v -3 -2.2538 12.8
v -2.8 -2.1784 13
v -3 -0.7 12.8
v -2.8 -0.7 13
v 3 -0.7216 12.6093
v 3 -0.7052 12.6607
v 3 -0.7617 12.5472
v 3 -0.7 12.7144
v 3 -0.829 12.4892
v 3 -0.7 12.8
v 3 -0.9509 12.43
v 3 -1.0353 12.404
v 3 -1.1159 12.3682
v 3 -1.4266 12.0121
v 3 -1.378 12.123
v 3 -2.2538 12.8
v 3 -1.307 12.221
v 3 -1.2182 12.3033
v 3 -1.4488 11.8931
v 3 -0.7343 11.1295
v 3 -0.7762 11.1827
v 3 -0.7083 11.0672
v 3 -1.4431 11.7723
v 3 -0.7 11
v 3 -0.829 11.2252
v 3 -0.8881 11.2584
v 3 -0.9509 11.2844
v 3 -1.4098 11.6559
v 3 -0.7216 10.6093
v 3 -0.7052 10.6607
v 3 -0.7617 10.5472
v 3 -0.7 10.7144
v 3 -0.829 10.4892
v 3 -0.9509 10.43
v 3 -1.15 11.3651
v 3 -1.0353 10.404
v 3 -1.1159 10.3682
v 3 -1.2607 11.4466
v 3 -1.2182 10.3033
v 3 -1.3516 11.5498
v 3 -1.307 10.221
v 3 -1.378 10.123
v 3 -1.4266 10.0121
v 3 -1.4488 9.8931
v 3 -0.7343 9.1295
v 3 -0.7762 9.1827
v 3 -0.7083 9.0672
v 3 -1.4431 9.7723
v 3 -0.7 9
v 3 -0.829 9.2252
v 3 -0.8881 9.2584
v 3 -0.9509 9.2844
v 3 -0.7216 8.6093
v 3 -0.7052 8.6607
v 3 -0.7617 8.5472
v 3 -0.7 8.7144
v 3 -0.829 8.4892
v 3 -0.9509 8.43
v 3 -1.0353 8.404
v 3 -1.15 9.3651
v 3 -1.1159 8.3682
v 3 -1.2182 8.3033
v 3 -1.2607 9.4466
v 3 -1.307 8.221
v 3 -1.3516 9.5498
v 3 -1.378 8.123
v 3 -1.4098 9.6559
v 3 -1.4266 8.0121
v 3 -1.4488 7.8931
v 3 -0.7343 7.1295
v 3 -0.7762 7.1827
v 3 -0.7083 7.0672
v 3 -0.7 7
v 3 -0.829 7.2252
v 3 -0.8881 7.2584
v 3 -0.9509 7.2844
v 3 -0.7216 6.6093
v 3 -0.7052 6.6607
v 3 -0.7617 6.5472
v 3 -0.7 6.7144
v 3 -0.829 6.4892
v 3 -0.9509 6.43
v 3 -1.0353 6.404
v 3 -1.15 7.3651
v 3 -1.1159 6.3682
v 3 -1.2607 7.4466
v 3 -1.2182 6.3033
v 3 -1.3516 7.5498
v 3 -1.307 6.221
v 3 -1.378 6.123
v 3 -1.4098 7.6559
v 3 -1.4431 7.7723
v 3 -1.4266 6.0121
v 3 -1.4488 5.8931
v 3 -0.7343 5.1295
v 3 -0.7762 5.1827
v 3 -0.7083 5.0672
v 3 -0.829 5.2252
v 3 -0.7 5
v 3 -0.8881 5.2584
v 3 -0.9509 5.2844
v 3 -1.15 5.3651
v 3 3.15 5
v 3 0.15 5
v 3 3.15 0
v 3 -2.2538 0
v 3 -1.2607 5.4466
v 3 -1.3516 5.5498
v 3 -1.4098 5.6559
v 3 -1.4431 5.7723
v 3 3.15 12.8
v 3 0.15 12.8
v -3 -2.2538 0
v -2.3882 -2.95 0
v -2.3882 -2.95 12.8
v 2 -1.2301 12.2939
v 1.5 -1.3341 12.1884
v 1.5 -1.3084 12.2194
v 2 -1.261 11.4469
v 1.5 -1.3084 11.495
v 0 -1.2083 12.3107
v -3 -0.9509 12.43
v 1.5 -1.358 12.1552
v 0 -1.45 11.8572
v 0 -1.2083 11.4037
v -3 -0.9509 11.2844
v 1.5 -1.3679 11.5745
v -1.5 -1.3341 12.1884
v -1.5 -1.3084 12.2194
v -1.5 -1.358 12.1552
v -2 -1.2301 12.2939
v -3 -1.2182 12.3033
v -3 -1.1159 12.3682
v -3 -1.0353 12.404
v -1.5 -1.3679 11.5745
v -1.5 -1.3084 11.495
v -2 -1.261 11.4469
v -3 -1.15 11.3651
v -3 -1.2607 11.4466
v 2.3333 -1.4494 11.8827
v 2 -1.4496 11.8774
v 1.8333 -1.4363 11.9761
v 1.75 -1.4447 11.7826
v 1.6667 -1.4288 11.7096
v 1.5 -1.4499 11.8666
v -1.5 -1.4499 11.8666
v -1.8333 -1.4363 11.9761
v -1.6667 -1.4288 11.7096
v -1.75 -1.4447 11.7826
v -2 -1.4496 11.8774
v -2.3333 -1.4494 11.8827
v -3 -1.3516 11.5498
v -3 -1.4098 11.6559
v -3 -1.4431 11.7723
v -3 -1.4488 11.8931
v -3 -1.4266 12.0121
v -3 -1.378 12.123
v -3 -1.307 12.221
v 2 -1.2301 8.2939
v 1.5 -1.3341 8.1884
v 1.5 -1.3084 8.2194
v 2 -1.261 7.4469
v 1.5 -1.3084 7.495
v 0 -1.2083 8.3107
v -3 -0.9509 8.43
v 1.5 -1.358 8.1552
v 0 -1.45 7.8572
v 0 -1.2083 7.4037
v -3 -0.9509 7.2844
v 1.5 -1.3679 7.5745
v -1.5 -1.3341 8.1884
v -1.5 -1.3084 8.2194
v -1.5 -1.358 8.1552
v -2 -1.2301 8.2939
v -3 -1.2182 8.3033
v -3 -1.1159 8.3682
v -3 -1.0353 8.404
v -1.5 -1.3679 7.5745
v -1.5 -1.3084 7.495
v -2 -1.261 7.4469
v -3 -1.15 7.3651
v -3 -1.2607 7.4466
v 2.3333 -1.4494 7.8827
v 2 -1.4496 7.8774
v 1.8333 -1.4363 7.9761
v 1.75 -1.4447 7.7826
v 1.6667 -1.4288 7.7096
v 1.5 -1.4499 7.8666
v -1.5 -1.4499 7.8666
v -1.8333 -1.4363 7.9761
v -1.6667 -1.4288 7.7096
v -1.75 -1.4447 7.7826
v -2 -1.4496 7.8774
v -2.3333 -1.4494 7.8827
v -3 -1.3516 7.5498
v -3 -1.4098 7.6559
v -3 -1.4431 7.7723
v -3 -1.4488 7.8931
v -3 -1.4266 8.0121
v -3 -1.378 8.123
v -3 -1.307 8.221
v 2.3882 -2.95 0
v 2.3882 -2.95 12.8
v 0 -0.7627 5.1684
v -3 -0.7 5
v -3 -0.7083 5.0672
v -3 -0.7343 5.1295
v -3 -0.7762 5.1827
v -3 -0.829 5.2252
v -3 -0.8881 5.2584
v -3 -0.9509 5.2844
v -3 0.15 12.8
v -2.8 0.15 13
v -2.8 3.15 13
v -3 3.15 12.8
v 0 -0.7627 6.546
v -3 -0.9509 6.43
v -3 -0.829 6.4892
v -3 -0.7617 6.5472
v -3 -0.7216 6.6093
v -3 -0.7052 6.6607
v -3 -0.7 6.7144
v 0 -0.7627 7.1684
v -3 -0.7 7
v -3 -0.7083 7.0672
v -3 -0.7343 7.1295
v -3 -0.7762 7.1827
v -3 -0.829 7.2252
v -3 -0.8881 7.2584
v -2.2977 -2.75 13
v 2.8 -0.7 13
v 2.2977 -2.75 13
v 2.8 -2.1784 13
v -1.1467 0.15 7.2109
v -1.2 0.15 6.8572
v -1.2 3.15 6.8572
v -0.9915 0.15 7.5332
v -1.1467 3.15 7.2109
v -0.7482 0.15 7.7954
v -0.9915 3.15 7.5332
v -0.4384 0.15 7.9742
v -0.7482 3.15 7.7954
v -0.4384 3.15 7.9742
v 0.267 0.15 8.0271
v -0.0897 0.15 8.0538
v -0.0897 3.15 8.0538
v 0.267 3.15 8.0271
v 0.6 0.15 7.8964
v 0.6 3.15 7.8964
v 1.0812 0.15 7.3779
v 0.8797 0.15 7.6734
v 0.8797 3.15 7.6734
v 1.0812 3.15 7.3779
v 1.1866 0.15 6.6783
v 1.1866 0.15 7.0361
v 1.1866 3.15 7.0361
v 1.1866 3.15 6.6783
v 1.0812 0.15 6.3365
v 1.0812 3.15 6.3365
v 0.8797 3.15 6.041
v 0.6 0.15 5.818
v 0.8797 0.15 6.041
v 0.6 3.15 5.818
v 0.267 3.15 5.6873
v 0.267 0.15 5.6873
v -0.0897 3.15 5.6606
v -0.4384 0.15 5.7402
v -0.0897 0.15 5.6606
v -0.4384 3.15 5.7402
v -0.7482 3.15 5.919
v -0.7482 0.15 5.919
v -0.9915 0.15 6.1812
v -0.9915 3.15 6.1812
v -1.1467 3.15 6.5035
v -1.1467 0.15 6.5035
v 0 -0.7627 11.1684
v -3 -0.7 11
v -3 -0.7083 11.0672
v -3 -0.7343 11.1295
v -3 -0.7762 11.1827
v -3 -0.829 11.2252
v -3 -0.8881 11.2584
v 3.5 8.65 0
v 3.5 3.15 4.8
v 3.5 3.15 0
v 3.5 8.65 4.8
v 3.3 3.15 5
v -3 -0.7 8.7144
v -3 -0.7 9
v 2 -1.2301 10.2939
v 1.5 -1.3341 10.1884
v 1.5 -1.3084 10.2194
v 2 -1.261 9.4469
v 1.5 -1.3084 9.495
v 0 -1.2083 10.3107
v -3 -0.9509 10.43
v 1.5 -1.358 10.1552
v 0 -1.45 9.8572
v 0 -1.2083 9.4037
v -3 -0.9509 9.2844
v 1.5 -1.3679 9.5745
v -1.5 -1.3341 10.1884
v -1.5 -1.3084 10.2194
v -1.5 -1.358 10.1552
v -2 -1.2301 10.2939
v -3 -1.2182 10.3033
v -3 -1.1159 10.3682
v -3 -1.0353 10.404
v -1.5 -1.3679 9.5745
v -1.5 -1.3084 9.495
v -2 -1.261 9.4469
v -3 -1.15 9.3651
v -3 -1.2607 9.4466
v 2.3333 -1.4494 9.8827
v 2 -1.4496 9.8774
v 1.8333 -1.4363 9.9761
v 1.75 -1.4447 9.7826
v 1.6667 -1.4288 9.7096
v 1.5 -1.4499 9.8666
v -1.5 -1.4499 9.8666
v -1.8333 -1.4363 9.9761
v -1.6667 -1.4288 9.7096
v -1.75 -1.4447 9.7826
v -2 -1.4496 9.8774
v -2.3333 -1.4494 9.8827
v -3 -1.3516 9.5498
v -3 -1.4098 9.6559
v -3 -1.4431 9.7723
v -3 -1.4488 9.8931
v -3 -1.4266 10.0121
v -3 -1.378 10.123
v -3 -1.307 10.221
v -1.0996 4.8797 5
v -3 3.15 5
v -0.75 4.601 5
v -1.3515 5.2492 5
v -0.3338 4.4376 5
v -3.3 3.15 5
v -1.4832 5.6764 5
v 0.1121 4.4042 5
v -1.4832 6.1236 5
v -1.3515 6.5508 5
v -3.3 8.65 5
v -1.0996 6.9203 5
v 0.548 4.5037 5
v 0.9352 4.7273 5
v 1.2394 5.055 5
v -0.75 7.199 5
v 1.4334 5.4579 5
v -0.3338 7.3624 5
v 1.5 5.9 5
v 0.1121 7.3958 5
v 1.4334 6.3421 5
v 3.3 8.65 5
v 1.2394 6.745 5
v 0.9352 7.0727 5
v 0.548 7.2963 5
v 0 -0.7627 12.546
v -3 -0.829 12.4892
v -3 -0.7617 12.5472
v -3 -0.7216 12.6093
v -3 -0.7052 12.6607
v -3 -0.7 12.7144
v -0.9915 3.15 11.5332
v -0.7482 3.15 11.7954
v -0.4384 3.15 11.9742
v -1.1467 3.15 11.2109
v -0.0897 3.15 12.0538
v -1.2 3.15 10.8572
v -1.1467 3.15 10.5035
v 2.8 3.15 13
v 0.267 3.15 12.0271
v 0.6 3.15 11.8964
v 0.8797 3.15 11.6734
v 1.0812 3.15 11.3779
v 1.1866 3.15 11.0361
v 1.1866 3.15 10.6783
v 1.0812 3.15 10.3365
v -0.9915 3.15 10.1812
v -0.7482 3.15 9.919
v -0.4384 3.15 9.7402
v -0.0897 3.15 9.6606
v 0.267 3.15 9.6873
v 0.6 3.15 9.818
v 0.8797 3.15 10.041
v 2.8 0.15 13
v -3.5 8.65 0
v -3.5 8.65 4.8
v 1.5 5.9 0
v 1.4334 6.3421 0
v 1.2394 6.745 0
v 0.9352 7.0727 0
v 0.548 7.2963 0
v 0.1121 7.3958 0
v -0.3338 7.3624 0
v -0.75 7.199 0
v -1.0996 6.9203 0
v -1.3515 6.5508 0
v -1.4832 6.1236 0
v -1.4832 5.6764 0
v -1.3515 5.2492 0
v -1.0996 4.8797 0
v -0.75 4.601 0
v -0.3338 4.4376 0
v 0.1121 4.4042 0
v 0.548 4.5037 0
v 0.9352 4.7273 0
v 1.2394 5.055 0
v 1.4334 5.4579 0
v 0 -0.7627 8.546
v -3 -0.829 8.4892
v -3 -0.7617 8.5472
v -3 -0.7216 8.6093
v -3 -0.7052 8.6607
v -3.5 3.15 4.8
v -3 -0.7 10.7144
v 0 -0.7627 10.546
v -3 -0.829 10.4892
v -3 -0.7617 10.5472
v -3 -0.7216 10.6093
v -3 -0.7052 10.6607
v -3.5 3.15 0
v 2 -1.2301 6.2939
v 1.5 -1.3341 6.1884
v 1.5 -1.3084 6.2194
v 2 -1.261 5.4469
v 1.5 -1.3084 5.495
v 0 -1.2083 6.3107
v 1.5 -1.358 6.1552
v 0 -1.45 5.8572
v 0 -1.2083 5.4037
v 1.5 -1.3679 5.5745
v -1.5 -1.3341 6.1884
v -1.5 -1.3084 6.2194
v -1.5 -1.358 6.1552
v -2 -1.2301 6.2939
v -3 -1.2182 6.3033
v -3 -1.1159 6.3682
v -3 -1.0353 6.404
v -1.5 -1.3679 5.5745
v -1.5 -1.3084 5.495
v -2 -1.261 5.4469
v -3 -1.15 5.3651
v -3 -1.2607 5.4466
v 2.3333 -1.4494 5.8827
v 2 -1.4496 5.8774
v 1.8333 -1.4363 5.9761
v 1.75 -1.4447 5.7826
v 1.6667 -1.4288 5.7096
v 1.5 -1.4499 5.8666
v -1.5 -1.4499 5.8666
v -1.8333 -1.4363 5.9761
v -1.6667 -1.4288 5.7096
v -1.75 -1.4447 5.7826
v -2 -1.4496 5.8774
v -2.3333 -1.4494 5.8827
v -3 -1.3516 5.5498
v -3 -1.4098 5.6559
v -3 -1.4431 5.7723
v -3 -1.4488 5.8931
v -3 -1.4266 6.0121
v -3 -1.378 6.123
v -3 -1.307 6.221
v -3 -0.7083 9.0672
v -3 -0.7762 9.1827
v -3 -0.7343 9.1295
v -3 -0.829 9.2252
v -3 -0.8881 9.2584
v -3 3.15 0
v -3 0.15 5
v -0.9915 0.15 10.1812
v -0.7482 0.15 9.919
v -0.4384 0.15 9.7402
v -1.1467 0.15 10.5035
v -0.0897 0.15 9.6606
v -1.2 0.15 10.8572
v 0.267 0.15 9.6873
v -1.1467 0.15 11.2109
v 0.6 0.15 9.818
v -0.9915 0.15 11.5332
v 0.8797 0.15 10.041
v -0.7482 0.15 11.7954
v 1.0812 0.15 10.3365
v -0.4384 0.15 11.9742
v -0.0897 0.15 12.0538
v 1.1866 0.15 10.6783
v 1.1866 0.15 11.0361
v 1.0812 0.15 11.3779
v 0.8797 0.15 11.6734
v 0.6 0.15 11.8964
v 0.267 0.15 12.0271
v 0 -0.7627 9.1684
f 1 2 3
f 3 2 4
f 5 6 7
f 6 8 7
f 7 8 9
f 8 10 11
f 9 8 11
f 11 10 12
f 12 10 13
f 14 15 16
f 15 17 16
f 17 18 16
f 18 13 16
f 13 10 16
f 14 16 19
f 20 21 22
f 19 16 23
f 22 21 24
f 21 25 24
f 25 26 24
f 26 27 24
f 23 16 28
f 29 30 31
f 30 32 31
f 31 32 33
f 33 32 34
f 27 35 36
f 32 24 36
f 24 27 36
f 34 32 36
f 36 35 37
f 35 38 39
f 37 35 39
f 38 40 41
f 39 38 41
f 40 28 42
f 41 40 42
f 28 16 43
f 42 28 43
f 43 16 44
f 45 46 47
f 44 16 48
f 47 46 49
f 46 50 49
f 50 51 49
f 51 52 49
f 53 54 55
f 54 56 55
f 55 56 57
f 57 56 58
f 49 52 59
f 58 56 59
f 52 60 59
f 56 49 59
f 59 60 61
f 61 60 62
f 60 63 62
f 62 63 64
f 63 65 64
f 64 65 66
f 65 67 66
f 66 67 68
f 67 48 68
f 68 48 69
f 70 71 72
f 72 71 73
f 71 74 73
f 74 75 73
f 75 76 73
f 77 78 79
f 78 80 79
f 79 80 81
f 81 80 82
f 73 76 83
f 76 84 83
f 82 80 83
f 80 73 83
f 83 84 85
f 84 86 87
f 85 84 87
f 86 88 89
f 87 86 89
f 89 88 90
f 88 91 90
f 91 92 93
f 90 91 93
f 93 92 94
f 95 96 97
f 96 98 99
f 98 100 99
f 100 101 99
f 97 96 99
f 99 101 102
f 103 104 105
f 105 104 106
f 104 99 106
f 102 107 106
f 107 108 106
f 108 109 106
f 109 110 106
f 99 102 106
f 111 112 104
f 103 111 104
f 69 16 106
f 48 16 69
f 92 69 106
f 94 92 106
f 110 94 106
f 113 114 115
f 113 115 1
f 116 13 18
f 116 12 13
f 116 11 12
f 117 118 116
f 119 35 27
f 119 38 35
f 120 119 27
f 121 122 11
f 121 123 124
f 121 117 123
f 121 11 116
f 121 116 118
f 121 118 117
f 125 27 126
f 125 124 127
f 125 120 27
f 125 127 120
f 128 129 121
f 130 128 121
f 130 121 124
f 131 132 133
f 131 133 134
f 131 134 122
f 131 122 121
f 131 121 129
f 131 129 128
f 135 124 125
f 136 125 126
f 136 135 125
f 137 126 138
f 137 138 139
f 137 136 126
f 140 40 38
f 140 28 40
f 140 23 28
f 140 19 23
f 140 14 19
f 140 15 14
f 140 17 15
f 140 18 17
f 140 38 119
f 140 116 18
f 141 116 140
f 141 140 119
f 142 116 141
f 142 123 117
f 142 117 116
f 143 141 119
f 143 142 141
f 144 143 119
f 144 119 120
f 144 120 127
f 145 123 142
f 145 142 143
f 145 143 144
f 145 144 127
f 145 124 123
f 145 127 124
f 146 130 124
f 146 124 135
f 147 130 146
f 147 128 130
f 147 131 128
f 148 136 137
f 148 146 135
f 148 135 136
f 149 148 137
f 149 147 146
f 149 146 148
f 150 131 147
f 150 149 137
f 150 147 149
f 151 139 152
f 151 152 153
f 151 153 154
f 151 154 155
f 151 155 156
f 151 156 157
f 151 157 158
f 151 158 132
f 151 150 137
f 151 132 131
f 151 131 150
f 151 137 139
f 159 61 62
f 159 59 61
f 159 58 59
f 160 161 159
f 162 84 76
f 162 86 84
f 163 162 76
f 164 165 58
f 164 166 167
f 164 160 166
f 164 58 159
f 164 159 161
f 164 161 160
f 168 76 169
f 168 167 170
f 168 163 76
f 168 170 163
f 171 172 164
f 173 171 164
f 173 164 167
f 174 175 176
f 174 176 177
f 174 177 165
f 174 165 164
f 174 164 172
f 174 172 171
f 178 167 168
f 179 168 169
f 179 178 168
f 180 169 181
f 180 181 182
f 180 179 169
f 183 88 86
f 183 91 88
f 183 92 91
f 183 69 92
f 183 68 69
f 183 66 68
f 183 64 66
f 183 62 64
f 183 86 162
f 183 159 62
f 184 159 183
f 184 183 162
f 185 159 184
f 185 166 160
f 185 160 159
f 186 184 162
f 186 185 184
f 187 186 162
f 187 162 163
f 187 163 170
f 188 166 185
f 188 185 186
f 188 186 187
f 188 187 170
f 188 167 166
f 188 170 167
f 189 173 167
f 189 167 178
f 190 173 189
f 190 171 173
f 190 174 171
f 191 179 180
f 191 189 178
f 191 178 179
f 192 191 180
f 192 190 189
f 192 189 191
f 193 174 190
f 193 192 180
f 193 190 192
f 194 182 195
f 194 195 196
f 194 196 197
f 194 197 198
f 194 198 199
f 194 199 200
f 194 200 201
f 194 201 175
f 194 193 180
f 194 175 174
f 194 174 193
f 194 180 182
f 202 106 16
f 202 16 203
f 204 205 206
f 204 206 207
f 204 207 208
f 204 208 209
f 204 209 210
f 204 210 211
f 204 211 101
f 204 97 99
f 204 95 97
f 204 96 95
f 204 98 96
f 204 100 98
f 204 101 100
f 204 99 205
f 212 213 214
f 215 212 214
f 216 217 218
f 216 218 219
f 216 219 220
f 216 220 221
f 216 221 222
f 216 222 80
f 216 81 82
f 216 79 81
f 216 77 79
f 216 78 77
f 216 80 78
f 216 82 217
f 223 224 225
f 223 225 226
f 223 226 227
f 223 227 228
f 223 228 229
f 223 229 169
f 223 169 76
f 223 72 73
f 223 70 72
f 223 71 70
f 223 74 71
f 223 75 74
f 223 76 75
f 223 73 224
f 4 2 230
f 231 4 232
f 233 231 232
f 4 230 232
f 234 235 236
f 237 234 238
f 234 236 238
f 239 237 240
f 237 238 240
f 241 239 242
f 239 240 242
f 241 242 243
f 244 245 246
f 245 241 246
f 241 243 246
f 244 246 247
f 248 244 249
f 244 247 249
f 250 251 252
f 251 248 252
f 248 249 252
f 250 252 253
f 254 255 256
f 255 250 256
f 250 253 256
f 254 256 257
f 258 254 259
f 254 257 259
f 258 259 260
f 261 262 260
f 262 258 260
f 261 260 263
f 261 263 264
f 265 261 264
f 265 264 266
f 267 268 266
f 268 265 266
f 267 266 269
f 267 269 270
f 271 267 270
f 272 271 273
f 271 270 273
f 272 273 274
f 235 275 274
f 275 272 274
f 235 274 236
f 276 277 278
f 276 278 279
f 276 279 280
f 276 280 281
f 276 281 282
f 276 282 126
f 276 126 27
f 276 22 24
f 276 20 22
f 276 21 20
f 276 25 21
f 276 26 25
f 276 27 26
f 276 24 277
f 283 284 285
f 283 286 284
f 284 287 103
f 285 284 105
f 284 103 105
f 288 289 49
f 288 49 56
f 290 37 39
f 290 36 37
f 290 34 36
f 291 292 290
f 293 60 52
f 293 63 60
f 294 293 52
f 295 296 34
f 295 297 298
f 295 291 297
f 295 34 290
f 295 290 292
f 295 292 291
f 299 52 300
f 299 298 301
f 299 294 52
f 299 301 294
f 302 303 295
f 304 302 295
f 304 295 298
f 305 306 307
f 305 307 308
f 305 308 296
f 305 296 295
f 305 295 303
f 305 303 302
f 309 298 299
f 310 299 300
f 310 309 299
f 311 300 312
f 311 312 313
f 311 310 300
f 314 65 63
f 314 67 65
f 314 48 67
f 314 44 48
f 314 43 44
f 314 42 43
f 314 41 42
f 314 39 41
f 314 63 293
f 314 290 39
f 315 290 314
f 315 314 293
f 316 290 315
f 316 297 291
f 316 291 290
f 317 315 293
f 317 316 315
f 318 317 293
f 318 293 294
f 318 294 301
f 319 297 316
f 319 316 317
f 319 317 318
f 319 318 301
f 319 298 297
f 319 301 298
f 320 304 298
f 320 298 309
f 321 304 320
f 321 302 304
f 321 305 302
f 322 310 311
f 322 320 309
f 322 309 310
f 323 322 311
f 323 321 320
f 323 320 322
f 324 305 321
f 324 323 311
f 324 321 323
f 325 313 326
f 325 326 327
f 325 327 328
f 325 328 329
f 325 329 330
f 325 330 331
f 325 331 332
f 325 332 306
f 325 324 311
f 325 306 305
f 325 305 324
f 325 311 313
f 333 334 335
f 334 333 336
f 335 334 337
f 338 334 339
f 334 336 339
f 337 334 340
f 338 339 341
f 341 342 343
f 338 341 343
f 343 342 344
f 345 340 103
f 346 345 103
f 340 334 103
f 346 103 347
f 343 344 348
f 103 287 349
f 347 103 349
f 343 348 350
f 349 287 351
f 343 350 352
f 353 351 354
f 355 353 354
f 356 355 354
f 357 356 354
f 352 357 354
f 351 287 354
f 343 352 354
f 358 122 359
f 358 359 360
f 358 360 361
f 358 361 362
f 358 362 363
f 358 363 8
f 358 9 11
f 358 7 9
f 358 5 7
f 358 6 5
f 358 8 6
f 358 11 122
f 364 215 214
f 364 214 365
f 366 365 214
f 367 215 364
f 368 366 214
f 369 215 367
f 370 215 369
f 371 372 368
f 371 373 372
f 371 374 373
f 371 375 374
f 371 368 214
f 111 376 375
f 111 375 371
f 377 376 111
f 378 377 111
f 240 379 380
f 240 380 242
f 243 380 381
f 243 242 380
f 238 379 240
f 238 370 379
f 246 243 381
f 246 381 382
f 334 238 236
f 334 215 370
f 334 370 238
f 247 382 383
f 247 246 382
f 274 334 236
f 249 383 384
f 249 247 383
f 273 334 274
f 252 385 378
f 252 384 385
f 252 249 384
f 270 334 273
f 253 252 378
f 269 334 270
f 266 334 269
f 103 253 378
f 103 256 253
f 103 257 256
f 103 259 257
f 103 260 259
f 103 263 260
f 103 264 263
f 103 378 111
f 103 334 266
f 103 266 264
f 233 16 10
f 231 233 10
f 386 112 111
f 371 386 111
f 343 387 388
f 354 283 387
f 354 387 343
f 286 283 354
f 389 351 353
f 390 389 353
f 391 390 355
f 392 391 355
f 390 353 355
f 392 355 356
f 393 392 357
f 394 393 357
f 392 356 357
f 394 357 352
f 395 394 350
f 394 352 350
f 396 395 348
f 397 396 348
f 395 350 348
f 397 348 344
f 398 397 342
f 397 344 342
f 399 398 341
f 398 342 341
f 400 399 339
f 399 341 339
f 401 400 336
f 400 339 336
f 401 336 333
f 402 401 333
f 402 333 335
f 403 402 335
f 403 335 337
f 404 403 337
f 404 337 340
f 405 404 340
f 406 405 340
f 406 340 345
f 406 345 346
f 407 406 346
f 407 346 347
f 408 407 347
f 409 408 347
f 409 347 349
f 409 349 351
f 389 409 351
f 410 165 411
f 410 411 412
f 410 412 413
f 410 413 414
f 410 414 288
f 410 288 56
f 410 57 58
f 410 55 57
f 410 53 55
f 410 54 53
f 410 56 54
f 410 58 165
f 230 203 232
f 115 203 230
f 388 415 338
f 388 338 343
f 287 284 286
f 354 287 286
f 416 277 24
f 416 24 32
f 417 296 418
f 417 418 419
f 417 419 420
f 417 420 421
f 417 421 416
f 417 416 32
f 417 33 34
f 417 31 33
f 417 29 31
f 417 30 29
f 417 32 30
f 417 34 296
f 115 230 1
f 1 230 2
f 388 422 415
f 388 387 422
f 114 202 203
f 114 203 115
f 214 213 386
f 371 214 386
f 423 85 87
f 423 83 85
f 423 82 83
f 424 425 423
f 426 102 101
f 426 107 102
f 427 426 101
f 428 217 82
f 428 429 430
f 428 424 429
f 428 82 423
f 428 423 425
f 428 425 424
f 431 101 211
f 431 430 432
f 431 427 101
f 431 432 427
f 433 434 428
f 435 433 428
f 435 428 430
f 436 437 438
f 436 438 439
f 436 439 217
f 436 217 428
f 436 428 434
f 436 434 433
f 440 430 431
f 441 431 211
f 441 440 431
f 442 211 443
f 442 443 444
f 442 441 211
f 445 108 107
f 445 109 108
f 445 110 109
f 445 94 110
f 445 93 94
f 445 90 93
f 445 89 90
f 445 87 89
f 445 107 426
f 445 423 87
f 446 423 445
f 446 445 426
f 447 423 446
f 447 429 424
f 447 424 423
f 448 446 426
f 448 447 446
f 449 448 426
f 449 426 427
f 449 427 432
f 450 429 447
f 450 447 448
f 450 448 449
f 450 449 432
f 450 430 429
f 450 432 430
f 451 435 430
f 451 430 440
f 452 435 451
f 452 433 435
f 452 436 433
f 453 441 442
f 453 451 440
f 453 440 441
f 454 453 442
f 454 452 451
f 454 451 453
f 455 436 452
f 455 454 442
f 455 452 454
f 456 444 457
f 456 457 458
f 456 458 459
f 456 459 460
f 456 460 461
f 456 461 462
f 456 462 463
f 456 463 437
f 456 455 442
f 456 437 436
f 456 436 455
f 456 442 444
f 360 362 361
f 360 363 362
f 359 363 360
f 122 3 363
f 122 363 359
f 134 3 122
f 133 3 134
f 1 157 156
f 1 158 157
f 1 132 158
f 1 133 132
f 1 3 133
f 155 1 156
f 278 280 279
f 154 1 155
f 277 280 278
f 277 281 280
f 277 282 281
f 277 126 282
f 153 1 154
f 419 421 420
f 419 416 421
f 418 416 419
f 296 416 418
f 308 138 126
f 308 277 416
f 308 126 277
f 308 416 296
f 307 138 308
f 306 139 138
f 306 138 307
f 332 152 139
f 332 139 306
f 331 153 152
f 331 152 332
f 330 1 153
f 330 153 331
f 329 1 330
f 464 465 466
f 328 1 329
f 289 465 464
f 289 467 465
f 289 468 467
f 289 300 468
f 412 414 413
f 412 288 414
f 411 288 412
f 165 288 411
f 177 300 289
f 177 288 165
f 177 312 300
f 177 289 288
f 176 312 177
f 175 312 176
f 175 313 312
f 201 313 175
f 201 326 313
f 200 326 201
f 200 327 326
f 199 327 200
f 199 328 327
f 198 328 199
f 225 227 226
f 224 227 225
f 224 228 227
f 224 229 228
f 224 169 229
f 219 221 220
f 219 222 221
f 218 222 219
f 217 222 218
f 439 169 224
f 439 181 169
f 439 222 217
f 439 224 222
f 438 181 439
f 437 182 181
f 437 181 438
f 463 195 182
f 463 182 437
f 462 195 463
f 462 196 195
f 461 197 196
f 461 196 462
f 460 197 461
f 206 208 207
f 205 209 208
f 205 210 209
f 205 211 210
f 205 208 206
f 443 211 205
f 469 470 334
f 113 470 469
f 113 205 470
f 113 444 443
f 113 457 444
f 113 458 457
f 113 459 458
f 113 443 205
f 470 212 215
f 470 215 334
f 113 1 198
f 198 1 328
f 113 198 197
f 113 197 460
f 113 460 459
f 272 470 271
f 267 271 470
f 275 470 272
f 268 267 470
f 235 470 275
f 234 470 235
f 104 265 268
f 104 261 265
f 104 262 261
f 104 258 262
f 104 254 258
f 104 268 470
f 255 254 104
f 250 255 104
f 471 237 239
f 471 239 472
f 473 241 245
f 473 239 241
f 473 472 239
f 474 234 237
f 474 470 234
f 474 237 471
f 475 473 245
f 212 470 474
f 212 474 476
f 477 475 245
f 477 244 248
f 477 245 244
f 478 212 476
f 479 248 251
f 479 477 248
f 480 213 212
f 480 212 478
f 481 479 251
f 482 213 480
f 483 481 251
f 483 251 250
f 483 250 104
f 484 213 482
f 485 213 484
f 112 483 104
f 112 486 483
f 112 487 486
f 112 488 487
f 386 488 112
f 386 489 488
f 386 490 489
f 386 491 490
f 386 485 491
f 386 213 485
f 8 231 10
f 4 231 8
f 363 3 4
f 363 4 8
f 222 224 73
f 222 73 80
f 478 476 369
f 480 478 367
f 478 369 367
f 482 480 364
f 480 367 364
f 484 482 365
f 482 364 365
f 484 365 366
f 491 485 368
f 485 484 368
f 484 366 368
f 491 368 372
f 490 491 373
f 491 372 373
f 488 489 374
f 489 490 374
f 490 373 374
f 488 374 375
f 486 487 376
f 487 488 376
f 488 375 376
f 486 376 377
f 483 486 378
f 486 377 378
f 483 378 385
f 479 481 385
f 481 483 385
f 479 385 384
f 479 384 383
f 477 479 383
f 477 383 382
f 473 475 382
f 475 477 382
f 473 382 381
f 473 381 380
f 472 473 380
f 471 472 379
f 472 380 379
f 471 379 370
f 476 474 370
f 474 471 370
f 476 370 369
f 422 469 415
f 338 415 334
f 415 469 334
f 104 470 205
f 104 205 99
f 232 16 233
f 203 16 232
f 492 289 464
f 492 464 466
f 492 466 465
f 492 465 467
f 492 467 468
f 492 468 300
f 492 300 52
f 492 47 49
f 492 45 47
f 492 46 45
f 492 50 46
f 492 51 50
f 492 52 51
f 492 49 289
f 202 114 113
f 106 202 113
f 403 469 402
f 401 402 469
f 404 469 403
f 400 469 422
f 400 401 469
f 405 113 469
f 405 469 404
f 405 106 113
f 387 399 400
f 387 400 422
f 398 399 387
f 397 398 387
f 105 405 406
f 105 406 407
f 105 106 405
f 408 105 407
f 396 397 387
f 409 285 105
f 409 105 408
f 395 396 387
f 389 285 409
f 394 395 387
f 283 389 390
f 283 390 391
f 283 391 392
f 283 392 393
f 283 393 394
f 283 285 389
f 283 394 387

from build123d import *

# Parameters (mm, degrees)
BOSS_EXTRUDE1_DEPTH     = 13
SKETCH6_W               = 6
SKETCH6_H               = 5
BOSS_EXTRUDE4_DEPTH     = 5.6
SKETCH16_W              = 6
SKETCH16_H              = 8
BOSS_EXTRUDE5_DEPTH     = 0.1
CUT_EXTRUDE6_DEPTH      = 4
CUT_EXTRUDE6_DEPTH_BACK = 3.6
SKETCH15_R              = 1.2
CUT_EXTRUDE7_DEPTH      = 8.7202
CUT_EXTRUDE8_START      = -0.2202
SKETCH19_W              = 6
SKETCH19_H              = 8
SKETCH19_R              = 1.2
CUT_EXTRUDE8_DEPTH      = 0.2202
SKETCH12_R              = 1.5
CUT_EXTRUDE5_DEPTH      = 6
CHAMFER1_SIZE           = 0.2
SKETCH20_W              = 5
SKETCH20_H              = 5.5
BOSS_EXTRUDE6_DEPTH     = 0.5
SKETCH21_W              = 5
SKETCH21_H              = 5.5
BOSS_EXTRUDE7_DEPTH     = 0.5
CHAMFER2_SIZE           = 0.2


with BuildPart() as part:
    # Sketch1 → Boss-Extrude1 (new body)
    with BuildSketch(Plane.XY):
        Polygon((3, 3.05), (3, -2.253801214), (2.388188946, -2.95), (-2.388188946, -2.95), (-3, -2.253801214), (-3, 3.05), align=None)
    extrude(amount=BOSS_EXTRUDE1_DEPTH)

    # Sketch6 → Boss-Extrude4 (add)
    with BuildSketch(Plane(origin=(0, 3.05, 0), x_dir=(1, 0, 0), z_dir=(0, 1, 0))):
        with Locations((0, -2.5)):
            Rectangle(SKETCH6_W, SKETCH6_H)
    extrude(amount=BOSS_EXTRUDE4_DEPTH)

    # Sketch16 → Boss-Extrude5 (add)
    with BuildSketch(Plane(origin=(0, 3.05, 0), x_dir=(1, 0, 0), z_dir=(0, 1, 0))):
        with Locations((0, -9)):
            Rectangle(SKETCH16_W, SKETCH16_H)
    extrude(amount=BOSS_EXTRUDE5_DEPTH)

    # Sketch18 → Cut-Extrude6 (cut, two sides: drawn at the far end of the back side and taken through both)
    with BuildSketch(Plane(origin=(0, 0, 0), x_dir=(0, 0, -1), z_dir=(1, 0, 0)).offset(-CUT_EXTRUDE6_DEPTH_BACK)):
        with BuildLine():
            Line((-8.8572, -0.0702), (-12.8572, -0.0702))
            Line((-12.8572, -0.0702), (-13, -0.0702))
            Line((-13, -0.0702), (-13, -0.7))
            Line((-13, -0.7), (-12.8572, -0.7))
            Line((-12.8572, -0.7), (-12.7144, -0.7))
            add(Edge.make_bspline(
                [(-12.7144, -0.7), (-12.5198, -0.7), (-12.43, -0.9509)],
                knots=[0.103448276, 0.103448276, 0.103448276, 0.137931034, 0.137931034, 0.137931034], degree=2))
            add(Edge.make_bspline(
                [(-12.43, -0.9509), (-12.3594, -1.2388), (-12.13, -1.45), (-11.8572, -1.45)],
                knots=[0.137931034, 0.137931034, 0.137931034, 0.137931034, 0.172413793, 0.172413793, 0.172413793, 0.172413793], degree=3))
            add(Edge.make_bspline(
                [(-11.8572, -1.45), (-11.5844, -1.45), (-11.355, -1.2388), (-11.2844, -0.9509)],
                knots=[0.172413793, 0.172413793, 0.172413793, 0.172413793, 0.206896552, 0.206896552, 0.206896552, 0.206896552], degree=3))
            add(Edge.make_bspline(
                [(-11.2844, -0.9509), (-11.1946, -0.7), (-11, -0.7)],
                knots=[0.206896552, 0.206896552, 0.206896552, 0.24137931, 0.24137931, 0.24137931], degree=2))
            Line((-11, -0.7), (-10.8572, -0.7))
            Line((-10.8572, -0.7), (-10.7144, -0.7))
            add(Edge.make_bspline(
                [(-10.7144, -0.7), (-10.5198, -0.7), (-10.43, -0.9509)],
                knots=[0.310344828, 0.310344828, 0.310344828, 0.344827586, 0.344827586, 0.344827586], degree=2))
            add(Edge.make_bspline(
                [(-10.43, -0.9509), (-10.3594, -1.2388), (-10.13, -1.45), (-9.8572, -1.45)],
                knots=[0.344827586, 0.344827586, 0.344827586, 0.344827586, 0.379310345, 0.379310345, 0.379310345, 0.379310345], degree=3))
            add(Edge.make_bspline(
                [(-9.8572, -1.45), (-9.5844, -1.45), (-9.355, -1.2388), (-9.2844, -0.9509)],
                knots=[0.379310345, 0.379310345, 0.379310345, 0.379310345, 0.413793103, 0.413793103, 0.413793103, 0.413793103], degree=3))
            add(Edge.make_bspline(
                [(-9.2844, -0.9509), (-9.1946, -0.7), (-9, -0.7)],
                knots=[0.413793103, 0.413793103, 0.413793103, 0.448275862, 0.448275862, 0.448275862], degree=2))
            Line((-9, -0.7), (-8.8572, -0.7))
            Line((-8.8572, -0.7), (-8.7144, -0.7))
            add(Edge.make_bspline(
                [(-8.7144, -0.7), (-8.5198, -0.7), (-8.43, -0.9509)],
                knots=[0.517241379, 0.517241379, 0.517241379, 0.551724138, 0.551724138, 0.551724138], degree=2))
            add(Edge.make_bspline(
                [(-8.43, -0.9509), (-8.3594, -1.2388), (-8.13, -1.45), (-7.8572, -1.45)],
                knots=[0.551724138, 0.551724138, 0.551724138, 0.551724138, 0.586206897, 0.586206897, 0.586206897, 0.586206897], degree=3))
            add(Edge.make_bspline(
                [(-7.8572, -1.45), (-7.5844, -1.45), (-7.355, -1.2388), (-7.2844, -0.9509)],
                knots=[0.586206897, 0.586206897, 0.586206897, 0.586206897, 0.620689655, 0.620689655, 0.620689655, 0.620689655], degree=3))
            add(Edge.make_bspline(
                [(-7.2844, -0.9509), (-7.1946, -0.7), (-7, -0.7)],
                knots=[0.620689655, 0.620689655, 0.620689655, 0.655172414, 0.655172414, 0.655172414], degree=2))
            Line((-7, -0.7), (-6.8572, -0.7))
            Line((-6.8572, -0.7), (-6.7144, -0.7))
            add(Edge.make_bspline(
                [(-6.7144, -0.7), (-6.5198, -0.7), (-6.43, -0.9509)],
                knots=[0.724137931, 0.724137931, 0.724137931, 0.75862069, 0.75862069, 0.75862069], degree=2))
            add(Edge.make_bspline(
                [(-6.43, -0.9509), (-6.3594, -1.2388), (-6.13, -1.45), (-5.8572, -1.45)],
                knots=[0.75862069, 0.75862069, 0.75862069, 0.75862069, 0.793103448, 0.793103448, 0.793103448, 0.793103448], degree=3))
            add(Edge.make_bspline(
                [(-5.8572, -1.45), (-5.5844, -1.45), (-5.355, -1.2388), (-5.2844, -0.9509)],
                knots=[0.793103448, 0.793103448, 0.793103448, 0.793103448, 0.827586207, 0.827586207, 0.827586207, 0.827586207], degree=3))
            add(Edge.make_bspline(
                [(-5.2844, -0.9509), (-5.1946, -0.7), (-5, -0.7)],
                knots=[0.827586207, 0.827586207, 0.827586207, 0.862068966, 0.862068966, 0.862068966], degree=2))
            Line((-5, -0.7), (-5, -0.0702))
            Line((-5, -0.0702), (-8.8572, -0.0702))
        make_face()
    extrude(amount=CUT_EXTRUDE6_DEPTH + CUT_EXTRUDE6_DEPTH_BACK, mode=Mode.SUBTRACT)

    # Sketch15 → Cut-Extrude7 (cut)
    with BuildSketch(Plane(origin=(0, 8.65, 0), x_dir=(1, 0, 0), z_dir=(0, 1, 0))):
        with Locations(Location((0, -10.8572, 0), (0, 0, 180))):
            Circle(SKETCH15_R)
        with Locations(Location((0, -6.8572, 0), (0, 0, 180))):
            Circle(SKETCH15_R)
    extrude(amount=-CUT_EXTRUDE7_DEPTH, mode=Mode.SUBTRACT)

    # Sketch19 → Cut-Extrude8 (cut)
    with BuildSketch(Plane.XZ.offset(0.0702).offset(CUT_EXTRUDE8_START)):
        with Locations((0, 9)):
            Rectangle(SKETCH19_W, SKETCH19_H)
        with Locations(Location((0, 10.8572, 0), (0, 0, 180))):
            Circle(SKETCH19_R, mode=Mode.SUBTRACT)
        with Locations(Location((0, 6.8572, 0), (0, 0, 180))):
            Circle(SKETCH19_R, mode=Mode.SUBTRACT)
    extrude(amount=CUT_EXTRUDE8_DEPTH, mode=Mode.SUBTRACT)

    # Sketch12 → Cut-Extrude5 (cut)
    with BuildSketch(Plane.XY.offset(5)):
        with Locations((0, 5.9)):
            Circle(SKETCH12_R)
    extrude(amount=-CUT_EXTRUDE5_DEPTH, mode=Mode.SUBTRACT)

    # Chamfer1
    chamfer1_edges = [part.edges().sort_by_distance(p)[0] for p in [
        (-2.694094473, -2.601900607, 13),
        (0, -2.95, 13),
        (2.694094473, -2.601900607, 13),
        (3, 1.65, 13),
        (3, -1.476900607, 13),
        (-3, -1.476900607, 13),
        (-3, 1.65, 13),
    ]]
    chamfer(chamfer1_edges, length=CHAMFER1_SIZE)

    # Sketch20 → Boss-Extrude6 (add)
    with BuildSketch(Plane(origin=(3, 0, 0), x_dir=(0, 0, -1), z_dir=(1, 0, 0))):
        with Locations((-2.5, 5.9)):
            Rectangle(SKETCH20_W, SKETCH20_H)
    extrude(amount=BOSS_EXTRUDE6_DEPTH)

    # Sketch21 → Boss-Extrude7 (add)
    with BuildSketch(Plane.ZY.offset(3)):
        with Locations((2.5, 5.9)):
            Rectangle(SKETCH21_W, SKETCH21_H)
    extrude(amount=BOSS_EXTRUDE7_DEPTH)

    # Chamfer2
    chamfer2_edges = [part.edges().sort_by_distance(p)[0] for p in [
        (3.5, 5.9, 5),
        (-3.5, 5.9, 5),
    ]]
    chamfer(chamfer2_edges, length=CHAMFER2_SIZE)


solid = part.part
